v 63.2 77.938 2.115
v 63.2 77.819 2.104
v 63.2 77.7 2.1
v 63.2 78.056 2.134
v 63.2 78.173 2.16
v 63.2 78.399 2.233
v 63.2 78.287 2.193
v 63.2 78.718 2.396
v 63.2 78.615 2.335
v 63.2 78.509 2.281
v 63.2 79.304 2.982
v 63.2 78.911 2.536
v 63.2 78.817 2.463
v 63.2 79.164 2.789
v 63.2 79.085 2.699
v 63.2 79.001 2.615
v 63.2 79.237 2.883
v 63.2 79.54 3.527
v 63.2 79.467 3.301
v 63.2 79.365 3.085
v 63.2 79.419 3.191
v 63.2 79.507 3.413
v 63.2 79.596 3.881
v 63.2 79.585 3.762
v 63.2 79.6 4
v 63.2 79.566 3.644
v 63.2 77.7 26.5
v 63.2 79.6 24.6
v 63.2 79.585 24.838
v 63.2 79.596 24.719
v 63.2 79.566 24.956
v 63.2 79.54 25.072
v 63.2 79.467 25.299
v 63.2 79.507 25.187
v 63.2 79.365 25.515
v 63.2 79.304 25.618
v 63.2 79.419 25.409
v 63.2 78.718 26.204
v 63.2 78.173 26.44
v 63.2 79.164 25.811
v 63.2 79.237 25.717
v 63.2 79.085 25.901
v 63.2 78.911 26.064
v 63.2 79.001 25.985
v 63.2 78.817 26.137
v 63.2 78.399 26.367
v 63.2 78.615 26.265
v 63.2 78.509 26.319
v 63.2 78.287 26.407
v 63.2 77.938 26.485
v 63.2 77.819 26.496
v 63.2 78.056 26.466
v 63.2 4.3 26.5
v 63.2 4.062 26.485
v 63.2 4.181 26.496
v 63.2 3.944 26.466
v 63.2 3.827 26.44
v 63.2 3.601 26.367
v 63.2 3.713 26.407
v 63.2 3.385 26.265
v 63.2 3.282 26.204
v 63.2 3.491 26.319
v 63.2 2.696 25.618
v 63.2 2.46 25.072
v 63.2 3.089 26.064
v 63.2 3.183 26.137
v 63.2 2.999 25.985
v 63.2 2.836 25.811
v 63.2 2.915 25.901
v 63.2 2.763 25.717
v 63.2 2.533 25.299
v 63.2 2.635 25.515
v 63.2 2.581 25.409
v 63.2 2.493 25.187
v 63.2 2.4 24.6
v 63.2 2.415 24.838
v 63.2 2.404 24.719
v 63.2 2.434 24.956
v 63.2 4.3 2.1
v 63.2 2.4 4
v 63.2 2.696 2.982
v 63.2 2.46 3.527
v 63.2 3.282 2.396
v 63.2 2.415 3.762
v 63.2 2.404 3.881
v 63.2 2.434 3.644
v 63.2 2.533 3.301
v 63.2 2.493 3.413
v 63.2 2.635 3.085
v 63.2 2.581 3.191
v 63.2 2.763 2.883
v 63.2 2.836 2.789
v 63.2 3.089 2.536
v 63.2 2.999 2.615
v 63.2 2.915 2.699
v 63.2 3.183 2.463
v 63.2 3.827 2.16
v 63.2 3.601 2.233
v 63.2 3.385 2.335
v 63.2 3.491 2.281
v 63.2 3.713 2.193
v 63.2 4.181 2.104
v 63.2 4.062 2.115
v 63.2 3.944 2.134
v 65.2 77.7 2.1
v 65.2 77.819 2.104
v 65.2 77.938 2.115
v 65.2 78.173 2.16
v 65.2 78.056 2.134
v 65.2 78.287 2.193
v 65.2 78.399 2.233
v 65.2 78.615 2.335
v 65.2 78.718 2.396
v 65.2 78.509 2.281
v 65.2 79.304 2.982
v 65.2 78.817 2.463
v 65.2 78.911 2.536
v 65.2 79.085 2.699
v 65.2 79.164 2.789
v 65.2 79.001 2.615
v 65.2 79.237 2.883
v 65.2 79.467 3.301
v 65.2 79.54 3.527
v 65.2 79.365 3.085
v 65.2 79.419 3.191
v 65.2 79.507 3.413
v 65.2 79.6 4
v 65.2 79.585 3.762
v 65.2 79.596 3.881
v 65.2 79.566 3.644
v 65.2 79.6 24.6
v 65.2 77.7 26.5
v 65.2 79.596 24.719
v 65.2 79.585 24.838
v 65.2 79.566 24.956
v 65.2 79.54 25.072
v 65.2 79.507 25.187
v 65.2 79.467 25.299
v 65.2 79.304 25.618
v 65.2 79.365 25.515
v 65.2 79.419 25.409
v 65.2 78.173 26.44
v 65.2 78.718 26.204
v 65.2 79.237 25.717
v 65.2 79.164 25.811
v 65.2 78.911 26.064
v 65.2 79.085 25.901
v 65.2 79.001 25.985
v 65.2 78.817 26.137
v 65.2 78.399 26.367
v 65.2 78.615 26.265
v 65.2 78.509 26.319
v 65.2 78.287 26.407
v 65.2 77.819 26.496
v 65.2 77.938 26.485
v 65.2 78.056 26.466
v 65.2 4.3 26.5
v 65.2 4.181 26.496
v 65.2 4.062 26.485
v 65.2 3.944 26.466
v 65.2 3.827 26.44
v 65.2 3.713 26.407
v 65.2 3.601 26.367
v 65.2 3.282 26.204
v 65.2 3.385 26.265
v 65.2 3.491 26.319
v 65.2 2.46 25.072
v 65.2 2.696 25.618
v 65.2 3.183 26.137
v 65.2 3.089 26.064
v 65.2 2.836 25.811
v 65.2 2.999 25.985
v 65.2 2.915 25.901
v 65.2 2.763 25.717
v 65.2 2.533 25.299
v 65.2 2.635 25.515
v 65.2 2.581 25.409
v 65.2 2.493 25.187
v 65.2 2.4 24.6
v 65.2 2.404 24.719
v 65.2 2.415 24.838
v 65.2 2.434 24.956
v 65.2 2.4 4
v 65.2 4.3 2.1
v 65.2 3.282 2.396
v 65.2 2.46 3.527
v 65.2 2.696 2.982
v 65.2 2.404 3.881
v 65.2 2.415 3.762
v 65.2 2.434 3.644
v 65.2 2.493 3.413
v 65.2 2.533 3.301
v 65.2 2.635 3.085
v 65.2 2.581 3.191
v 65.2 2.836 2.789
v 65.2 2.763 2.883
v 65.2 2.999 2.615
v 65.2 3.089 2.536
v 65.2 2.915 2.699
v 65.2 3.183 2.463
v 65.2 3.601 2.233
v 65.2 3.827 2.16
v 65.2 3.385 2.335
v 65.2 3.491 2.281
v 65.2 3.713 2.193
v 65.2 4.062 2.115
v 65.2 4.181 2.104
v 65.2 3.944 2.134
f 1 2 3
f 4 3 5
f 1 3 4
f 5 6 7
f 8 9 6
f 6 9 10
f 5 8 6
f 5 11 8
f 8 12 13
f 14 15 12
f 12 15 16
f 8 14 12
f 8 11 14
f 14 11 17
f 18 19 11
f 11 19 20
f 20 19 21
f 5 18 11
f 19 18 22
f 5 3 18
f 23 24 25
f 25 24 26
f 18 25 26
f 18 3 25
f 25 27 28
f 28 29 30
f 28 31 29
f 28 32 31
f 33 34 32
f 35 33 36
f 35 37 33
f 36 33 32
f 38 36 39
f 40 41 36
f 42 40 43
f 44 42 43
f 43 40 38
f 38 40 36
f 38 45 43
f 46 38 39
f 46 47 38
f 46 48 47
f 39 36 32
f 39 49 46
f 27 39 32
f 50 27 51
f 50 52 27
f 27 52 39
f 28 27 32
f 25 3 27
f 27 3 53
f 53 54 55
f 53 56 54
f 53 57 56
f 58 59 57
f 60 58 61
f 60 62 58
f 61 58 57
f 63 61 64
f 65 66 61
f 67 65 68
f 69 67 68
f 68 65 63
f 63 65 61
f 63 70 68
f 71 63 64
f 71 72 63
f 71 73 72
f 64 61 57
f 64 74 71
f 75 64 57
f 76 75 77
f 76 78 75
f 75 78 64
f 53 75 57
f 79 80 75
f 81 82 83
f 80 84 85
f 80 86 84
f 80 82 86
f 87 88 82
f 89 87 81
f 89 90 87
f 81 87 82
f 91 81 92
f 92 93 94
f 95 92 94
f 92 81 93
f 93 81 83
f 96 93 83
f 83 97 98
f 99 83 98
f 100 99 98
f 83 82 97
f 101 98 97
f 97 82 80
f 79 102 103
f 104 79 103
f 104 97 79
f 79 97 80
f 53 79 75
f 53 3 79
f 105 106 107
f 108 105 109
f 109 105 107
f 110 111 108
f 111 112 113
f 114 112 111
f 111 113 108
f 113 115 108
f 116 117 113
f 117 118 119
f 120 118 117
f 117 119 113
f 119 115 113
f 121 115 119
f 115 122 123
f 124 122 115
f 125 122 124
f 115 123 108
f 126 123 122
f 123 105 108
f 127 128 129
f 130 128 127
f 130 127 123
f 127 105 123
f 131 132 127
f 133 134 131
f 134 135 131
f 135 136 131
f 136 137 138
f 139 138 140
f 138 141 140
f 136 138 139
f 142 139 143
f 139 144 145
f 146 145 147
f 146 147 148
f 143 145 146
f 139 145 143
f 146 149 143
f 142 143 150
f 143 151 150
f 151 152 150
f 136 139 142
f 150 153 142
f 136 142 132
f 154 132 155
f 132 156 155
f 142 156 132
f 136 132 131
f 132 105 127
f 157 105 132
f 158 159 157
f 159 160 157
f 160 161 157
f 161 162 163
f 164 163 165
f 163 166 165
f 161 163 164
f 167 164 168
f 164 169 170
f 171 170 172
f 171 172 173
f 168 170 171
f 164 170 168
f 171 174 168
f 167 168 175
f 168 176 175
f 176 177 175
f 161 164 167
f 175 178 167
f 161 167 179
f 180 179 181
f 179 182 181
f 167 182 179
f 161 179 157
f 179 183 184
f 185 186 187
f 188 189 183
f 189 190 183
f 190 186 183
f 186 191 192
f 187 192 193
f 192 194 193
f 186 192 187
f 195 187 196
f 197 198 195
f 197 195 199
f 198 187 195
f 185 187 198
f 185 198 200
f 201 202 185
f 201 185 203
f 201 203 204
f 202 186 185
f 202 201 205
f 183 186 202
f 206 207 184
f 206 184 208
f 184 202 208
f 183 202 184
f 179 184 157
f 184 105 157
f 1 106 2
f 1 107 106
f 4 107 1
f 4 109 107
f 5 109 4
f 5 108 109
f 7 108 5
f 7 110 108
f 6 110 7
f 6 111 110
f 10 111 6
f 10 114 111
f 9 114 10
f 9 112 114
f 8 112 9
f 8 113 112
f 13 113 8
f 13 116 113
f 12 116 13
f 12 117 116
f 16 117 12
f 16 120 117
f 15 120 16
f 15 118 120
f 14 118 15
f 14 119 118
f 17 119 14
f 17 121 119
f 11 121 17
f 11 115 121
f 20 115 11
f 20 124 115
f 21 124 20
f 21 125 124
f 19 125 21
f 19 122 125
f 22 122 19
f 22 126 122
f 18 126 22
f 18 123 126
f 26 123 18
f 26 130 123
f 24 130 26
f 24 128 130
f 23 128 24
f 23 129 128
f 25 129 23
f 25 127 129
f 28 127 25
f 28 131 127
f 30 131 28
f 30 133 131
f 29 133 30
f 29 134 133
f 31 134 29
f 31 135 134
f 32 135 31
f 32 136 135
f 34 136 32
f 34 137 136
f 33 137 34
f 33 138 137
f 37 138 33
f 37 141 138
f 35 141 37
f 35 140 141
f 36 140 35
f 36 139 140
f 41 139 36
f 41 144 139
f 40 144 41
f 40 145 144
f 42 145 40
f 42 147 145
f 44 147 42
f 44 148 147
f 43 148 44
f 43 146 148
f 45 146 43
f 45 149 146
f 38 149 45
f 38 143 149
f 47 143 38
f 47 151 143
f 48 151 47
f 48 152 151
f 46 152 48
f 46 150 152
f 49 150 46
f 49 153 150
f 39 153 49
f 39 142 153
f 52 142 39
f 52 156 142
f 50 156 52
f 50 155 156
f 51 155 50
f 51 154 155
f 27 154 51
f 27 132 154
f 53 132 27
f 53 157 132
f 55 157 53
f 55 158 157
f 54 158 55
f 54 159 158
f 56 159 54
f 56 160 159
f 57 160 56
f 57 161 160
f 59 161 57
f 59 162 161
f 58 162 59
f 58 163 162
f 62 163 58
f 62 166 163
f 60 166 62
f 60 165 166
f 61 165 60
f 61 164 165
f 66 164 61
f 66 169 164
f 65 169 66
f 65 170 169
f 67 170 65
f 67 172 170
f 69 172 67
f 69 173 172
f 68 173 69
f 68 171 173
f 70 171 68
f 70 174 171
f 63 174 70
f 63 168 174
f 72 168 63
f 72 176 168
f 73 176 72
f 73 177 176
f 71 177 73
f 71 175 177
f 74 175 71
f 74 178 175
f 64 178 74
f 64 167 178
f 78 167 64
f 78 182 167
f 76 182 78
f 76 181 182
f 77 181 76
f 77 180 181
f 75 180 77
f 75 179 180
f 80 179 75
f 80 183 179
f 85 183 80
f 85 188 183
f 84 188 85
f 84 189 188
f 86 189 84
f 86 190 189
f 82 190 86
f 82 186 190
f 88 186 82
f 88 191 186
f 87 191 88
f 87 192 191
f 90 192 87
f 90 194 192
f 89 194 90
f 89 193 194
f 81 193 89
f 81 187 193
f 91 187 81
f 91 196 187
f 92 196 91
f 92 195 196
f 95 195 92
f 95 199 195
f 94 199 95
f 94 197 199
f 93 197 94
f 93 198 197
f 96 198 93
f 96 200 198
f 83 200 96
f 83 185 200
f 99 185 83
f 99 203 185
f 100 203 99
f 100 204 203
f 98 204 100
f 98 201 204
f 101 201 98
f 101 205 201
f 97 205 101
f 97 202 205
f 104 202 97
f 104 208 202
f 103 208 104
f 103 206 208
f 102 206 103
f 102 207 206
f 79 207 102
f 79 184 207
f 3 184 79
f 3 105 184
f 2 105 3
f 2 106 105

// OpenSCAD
/* Box design originally by:
////////////////////////////////////////////////////////////////////
              -    FB Aka Heartman/Hearty 2016     -
              -   http://heartygfx.blogspot.com    -
              -       OpenScad Parametric Box      -
              -         CC BY-NC 3.0 License       -
////////////////////////////////////////////////////////////////////

Improved by jbebel:
http://github.com/jbebel/Ultimate-Box-Maker

To create a box, start by modifying the numerical parameters in the sections
below. This can be accomplished using a release of OpenSCAD newer than 2015.03.
As of the time of writing, this means that a development snapshot is required.
The Thingiverse Customizer may also potentially work, but at the time of
writing, it was inoperable.

The simplest choice is to hand-edit the .scad file. Feature toggles are
annotated with a comment. The other numerical parameters are measurements in
mm. Everything is parametrized, so if you double all the non-feature parameters
you will double the box size in every dimension. Certain parameters are derived
from other parameters. If you wish to override them, you may, but sensible
defaults have been chosen. Notably the design in this revision is particularly
PCB-centric, in that you should start with your PCB size and adjust the margins
around it to determine the box size. If you care more about the box size, you
can set the Length, Width, and Height explicitly, but read the comments around
them.

Once your box is sized appropriately, you can use the Panel modules to design
the holes and text for the front and back panels. Helper variables are provided
to assist you in positioning these holes relative to the PCB, if your holes are
for PCB-mounted components.

When you are ready to print, adjust the values in the "STL element to export"
section, and export each part one at a time.

Experimental options are provided for a screwless design, but these are
untested. In particular, the box fixation tabs may need thicknesses adjusted
in order to have the appropriate flexibility.
*/

// preview[view:north east, tilt:top diagonal]
//----------------------- Box parameters ---------------------------

/* [Box options] */
// - Wall thickness
Thick = 2;
// - Panel thickness
PanelThick = 2;
// - Font Thickness
FontThick = 0.5;
// - Filet Radius
Filet = 2;
// - 0 for beveled, 1 for rounded
Round = 1; // [0:No, 1:Yes]
// - Printer margin around interior cutouts
CutoutMargin = 0.3;
// - Margin between mating parts
PartMargin = 0.1;
// - PCB feet? (x4)
PCBFeet = 1; // [0:No, 1:Yes]
// - Decorations?
Decorations = 1; // [0:No, 1:Yes]
// - Decorations to ventilation holes
Vent = 1; // [0:No, 1:Yes]
// - Decoration-Holes width (in mm)
Vent_width = 1.5;
// - Tolerance (Panel/rails gap on one edge)
PanelThickGap = CutoutMargin + PartMargin;
PanelVerticalGap = PartMargin;
PanelHorizontalGap = CutoutMargin + PartMargin;


/* [Box Fixation Tabs] */
// - Side screw hole (or snap) diameter
ScrewHole = 2.2606;
// - Screw thread major diameter for outer shell
BoxHole = 2.8448;
// Thickness of fixation tabs
TabThick = 2;
// Back left tab
BLTab = 1; // [0:Bottom, 1:Top]
// Back right tab
BRTab = 1; // [0:Bottom, 1:Top]
// Front left tab
FLTab = 1; // [0:Bottom, 1:Top]
// Front right tab
FRTab = 1; // [0:Bottom, 1:Top]
// EXPERIMENTAL: Snap tabs
SnapTabs = 0; // [0:Screws, 1:Snaps]


/* [PCB options] */
// - PCB Length
PCBLength = 54;
// - PCB Width
PCBWidth = 68;
// - PCB Thickness
PCBThick = 1.6;
// You likely need to maintain |TabThick| margin on the left and right for tabs
// and whatnot.
// - Margin between front panel and PCB
FrontEdgeMargin = 2;
// - Margin between back panel and PCB
BackEdgeMargin = 2;
// - Margin between left wall and PCB
LeftEdgeMargin = 5;
// - Margin between right wall and PCB
RightEdgeMargin = 5;
// - Margin between top of PCB and box top.
TopMargin = 20;


/* [PCB_Feet] */
// - Foot height above box interior
FootHeight = 3;
// - Foot diameter
FootDia = 8;
// - Hole diameter, or peg for screwless design
FootHole = 0; // tap size for #4 coarse-thread
// - EXPERIMENTAL Screwless design
Screwless = 0; // [0:Screws, 1:Screwless]
FootFilet = FootHeight/4;

// Foot centers are specified as distance from PCB back-left corner.
// X is along the "length" axis, and Y is along the "width" axis.
// - Foot 1 distance from back PCB edge
Foot1X = 5;
// - Foot 1 distance from left PCB edge
Foot1Y = 5;
// - Foot 2 distance from back PCB edge
Foot2X = 5;
// - Foot 2 distance from right PCB edge
Foot2YFromEdge = 5;
Foot2Y = PCBWidth - Foot2YFromEdge;
// - Foot 3 distance from front PCB edge
Foot3XFromEdge = 5;
Foot3X = PCBLength - Foot3XFromEdge;
// - Foot 3 distance from left PCB edge
Foot3Y = 5;
// - Foot 4 distance from front PCB edge
Foot4XFromEdge = 5;
Foot4X = PCBLength - Foot4XFromEdge;
// - Foot 4 distance from right PCB edge
Foot4YFromEdge = 5;
Foot4Y = PCBWidth - Foot4YFromEdge;


/* [STL element to export] */
// - Top shell
TShell = 0; // [0:No, 1:Yes]
// - Bottom shell
BShell = 0; // [0:No, 1:Yes]
// - Front panel
FPanL = 1; // [0:No, 1:Yes]
// - Back panel
BPanL = 0; // [0:No, 1:Yes]
// - Panel holes and text
PanelFeatures = 0; // [0:No, 1:Yes]


/* [Hidden] */
// - Shell color
Couleur1 = "Orange";
// - Panel color
Couleur2 = "OrangeRed";
// - Text color
TextColor = "White";
// - making decorations thicker if it is a vent to make sure they go through
// shell
// Add a small number to Thick in case Filet is 0.
Dec_Thick = Vent ? Thick*1.001 + Filet : Thick/2;
// Separate vents with a square pillar by default.
Dec_Spacing = Thick + Vent_width;
// X offset to center of first vent
Dec_Offset = Thick*2 + PanelThick + PanelThickGap*2 + Dec_Spacing - Vent_width/2;

// Resolution based on Round parameter. Set this first number to something
// smaller to speed up processing. It should always be a multiple of 4.
Resolution = Round ? 100: 4;

/* Calculate box dimensions from PCB. If you want a more box-centric design
   where the outer diameter of the box matters more than the margins around
   the PCB you can set these manually. The PCB will still be placedaccording
   to the left and back margins, and if you want to use the screwless box
   design, you will need to set the TopMargin to
   (Height - Thick*2 - FootHeight - PCBThick)
*/
Length = PCBLength + FrontEdgeMargin + BackEdgeMargin + ((Thick + PanelThick + PanelThickGap*2)*2);
Width = PCBWidth + LeftEdgeMargin + RightEdgeMargin + Thick*2;
Height = FootHeight + PCBThick + TopMargin + Thick*2;
echo("Box: ", Length=Length, Width=Width, Height=Height);
// X position inset of mounting holes and tabs
MountInset = Thick*3 + PanelThick + PanelThickGap*2 + ScrewHole*4;

// Calculate panel dimensions from box dimensions.
PanelWidth = Width - Thick*2 - PanelHorizontalGap*2;
PanelHeight = Height - Thick*2 - PanelVerticalGap*2;


/*  Panel Manager

    Use the below 4 modules to produce holes and text on the front and back
    panels. The holes modules should contain instances of SquareHole or
    CylinderHole defined later in this file. The text modules should contain
    instances of LText or CText defined later in this file. It is
    recommended to use variables that you define for your needs to create
    the size and positions of these objects.
*/

// Calculate board-relative positions with respect to the panel, for
// convenience in placing panel elements.
TopOfBoardWRTPanel = FootHeight + PCBThick - PanelVerticalGap;
LeftEdgeOfBoardWRTFPanel = LeftEdgeMargin - PanelHorizontalGap;
LeftEdgeOfBoardWRTBPanel = RightEdgeMargin - PanelHorizontalGap;
// Visible panel edges
PanelBottomEdge = Thick - PanelVerticalGap;
PanelTopEdge = PanelHeight - Thick + PanelVerticalGap;
PanelLeftEdge = Thick - PanelHorizontalGap;
PanelRightEdge = PanelWidth - Thick + PanelHorizontalGap;


// Holes for front panel
module FPanelHoles() {
    // SquareHole(On/Off, Xpos,Ypos,Length,Width,Filet)
    SquareHole(1, 20, 20, 15, 10, 1);
    SquareHole(1, 40, 20, 15, 10, 1);
    SquareHole(1, 60, 20, 15, 10, 1);
    // CylinderHole(On/Off, Xpos, Ypos, Diameter)
    CylinderHole(1, 27, 40, 8);
    CylinderHole(1, 47, 40, 8);
    CylinderHole(1, 67, 40, 8);
    SquareHole(1, 20, 50, 80, 30, 3);
    CylinderHole(1, 93, 30, 10);
    SquareHole(1, 120, 20, 30, 60, 3);
}


// Text for front panel
module FPanelText() {
    // LText(On/Off, Xpos, Ypos, "Font", Size, "Text", "HAlign", "VAlign")
    LText(1, 20, 83, "Arial Black", 4, "Digital Screen", HAlign="left");
    LText(1, 120, 83, "Arial Black", 4, "Level", HAlign="left");
    LText(1, 20, 11, "Arial Black", 6, "  1     2      3", HAlign="left");
    // CText(On/Off, Xpos, Ypos, "Font", Size, Diameter, Arc(Deg), Starting Angle(Deg),"Text")
    CText(1, 93, 29, "Arial Black", 4, 10, 180, 0,
          ["1", "." , "3", "." , "5", "." , "7", "." , "9", "." , "11"]);
}


// Holes for back panel
module BPanelHoles() {
    CylinderHole(1,
                 LeftEdgeOfBoardWRTBPanel + 16.4,
                 TopOfBoardWRTPanel + 7,
                 5 + PartMargin*2);
    SquareHole(1,
               LeftEdgeOfBoardWRTBPanel + 37.3,
               TopOfBoardWRTPanel,
               39.2,
               12.55,
               1);
}


// Text for back panel
module BPanelText() {
    LText(1,
          LeftEdgeOfBoardWRTBPanel + 16.4,
          TopOfBoardWRTPanel + 7 + 5,
          "Arial Black",
          4, "PWR"
    );
    LText(1,
          LeftEdgeOfBoardWRTBPanel + 37.3 + 39.2/2,
          TopOfBoardWRTPanel + 12.55 + 2,
          "Arial Black",
          4,
          "DATA"
    );
}


// ------- You probably don't need to modify anything below this line. --------


/* Generic rounded box

    Produces a box of the specified dimensions. Corners are rounded
    according to Filet and Resolution parameters.

    Arguments:
    xshrink: the amount to reduce the length on one end compared to the full
        length
    yzshrink: the amount to reduce the width or height on one edge compared
        to the full box
*/
module RoundBox(xshrink=0, yzshrink=0) {
    Filet = (Filet > Thick*2) ? Filet - yzshrink : Filet;
    translate([xshrink, yzshrink, yzshrink]) {
        rotate([90, 0, 90]) {
            linear_extrude(height=Length - xshrink*2) {
                translate([Filet, Filet, 0]) {
                    offset(r=Filet, $fn=Resolution) {
                        square([Width - 2*yzshrink - 2*Filet, Height - 2*yzshrink - 2*Filet]);
                    }
                }
            }
        }
    }
}


/*  MainBox: Main box module

    This module produces the simple main box half. No feet, tabs, vents or
    fixation is applied here.
*/
module MainBox() {
    difference() {
        union() {
            // Makes a hollow box with walls of Thick thickness.
            difference() {
                RoundBox();
                RoundBox(xshrink=Thick, yzshrink=Thick);
            }
            // Makes interior backing for panel as a wall
            difference() {
                RoundBox(xshrink=(Thick + PanelThick + PanelThickGap*2), yzshrink=Thick/2);
                RoundBox(xshrink=(Thick*2 + PanelThick + PanelThickGap*2));
            }
        }
        // Remove the top half
        translate([-Thick, -Thick, Height/2]) {
            cube([Length + Thick*2, Width + Thick*2, Height]);
        }
        // Remove the center for panel visibility.
        RoundBox(xshrink=-Thick, yzshrink=Thick*2);
    }
}


/*  decoration: a single box decoration
*/
module decoration() {
    translate([-Vent_width/2, -Thick, -Thick]) {
        cube([Vent_width, Dec_Thick + Thick, Height/4 + Thick]);
    }
}


/* LeftDecorations: left decorations module

    Produces the decorations/vents for just the left side of the box.
    These can be rotated and translated for the right side.
*/
module LeftDecorations() {
    for (i=[0 : Dec_Spacing : Length/4]) {
        translate([Dec_Offset + i, 0, 0]) {
            decoration();
        }
        translate([Length - Dec_Offset - i, 0, 0]) {
            decoration();
        }
    }
}


/*  Decorations: decorations module

    This module produces the box vents or decorations.
*/
module Decorations() {
    LeftDecorations();
    // Mirror for the right side decorations
    translate([0, Width, 0]) {
        mirror([0, 1, 0]) {
            LeftDecorations();
        }
    }
}


/*  Coque: Shell module

    This module takes no arguments, but produces a box shell. This is half
    the box, including slots for end panels, rounded corners according to
    Filet and Resolution, and vents/decorations according to parameters.
*/
module Coque() {
    color(Couleur1) {
        difference() {
            MainBox();
            if (Decorations) {
                Decorations();
            }
        }
    }
}


/*  tab: tab module

    Produces a single box fixation tab with screw hole or snap button
*/
module tab() {
    translate([0, Thick, Height/2]) {
        rotate([90, 0, 180]) {
            difference() {
                linear_extrude(TabThick) {
                    difference() {
                        circle(r=4*ScrewHole, $fn=6);
                        if (!SnapTabs) {
                            translate([0, ScrewHole*2, 0]) {
                                circle(d=ScrewHole, $fn=100);
                            }
                        }
                    }
                }
                translate([-4*ScrewHole, -ScrewHole, TabThick]) {
                    rotate([90+45, 0, 0]) {
                        cube([8*ScrewHole, 3*ScrewHole, 5*ScrewHole]);
                    }
                }
                translate([-4*ScrewHole, 0, -PartMargin]) {
                    cube([8*ScrewHole,4*ScrewHole,PartMargin*2]);
                }
            }
            if (SnapTabs) {
                translate([0, ScrewHole*2, PartMargin]) {
                    difference() {
                        sphere(d=(ScrewHole - PartMargin*2), $fn=100);
                        translate([0, 0, ScrewHole/2 + TabThick/2]) {
                            cube(ScrewHole, center=true);
                        }
                    }
                }
            }
        }
    }
}


/*  Tabs: tabs module

    This module produces the wall fixation box tabs.
    Tabs are produced according to the parameters for XXTab indicating top
    or bottom.

    Arguments:
        top: 0 for bottom shell tabs. 1 for top shell tabs. defaults to bottom.
*/
module Tabs(top=0) {
    color(Couleur1) {
        if (BLTab == top) {
            translate([MountInset, 0, 0]) {
                tab();
            }
        }
        if (FLTab == top) {
            translate([Length - MountInset, 0, 0]) {
                tab();
            }
        }
        if (BRTab == top) {
            translate([MountInset, Width, 0]) {
                rotate([0, 0, 180]) {
                    tab();
                }
            }
        }
        if (FRTab == top) {
            translate([Length - MountInset, Width, 0]) {
                rotate([0, 0, 180]) {
                    tab();
                }
            }
        }
    }
}


/*  hole: hole module

    Produces a box hole for fixation. This is either a cylinder for a screw
    or a semispherical indention for snap tabs.
*/
module hole() {
    if (SnapTabs) {
        translate([0, -Thick, Height/2 - 2*ScrewHole]) {
            sphere(d=ScrewHole, $fn=100);
        }
    }
    else {
        translate([0, Thick, Height/2 - 2*ScrewHole]) {
            rotate([90, 0, 0]) {
                cylinder(Thick*3, d=BoxHole, $fn=100);
            }
        }
    }
}


/*  Holes: holes module

    This module produces the holes necessary in the box fixation tabs and in
    the wall of the box for the corresponding tabs to affix to. Holes are
    produced according to the parameters for XXTab indicating top or bottom.

    Arguments:
        top: 0 for bottom shell holes. 1 for top shell holes. defaults to
            bottom.
*/
module Holes(top=0) {
    color(Couleur1) {
        if (BRTab != top) {
            translate([MountInset, Width, 0]) {
                hole();
            }
        }
        if (FRTab != top) {
            translate([Length - MountInset, Width, 0]) {
                hole();
            }
        }
        if (BLTab != top) {
            translate([MountInset, 0, 0]) {
                rotate([0, 0, 180]) {
                    hole();
                }
            }
        }
        if (FLTab != top) {
            translate([Length - MountInset, 0, 0]) {
                rotate([0, 0, 180]) {
                    hole();
                }
            }
        }
    }
}

/*  PCB: PCB module

    Produces the model of the PCB using parameters for its size and thickness.
    The text PCB is placed on top of the board. This is called by the Feet()
    module with the % modifier which makes this module translucent and only
    viewed in preview mode.
*/
module PCB() {
    translate([0, 0, FootHeight]) {
        cube([PCBLength, PCBWidth, PCBThick]);
        translate([PCBLength/2, PCBWidth/2, PCBThick]) {
            color("Olive") {
                linear_extrude(height=FontThick) {
                    text("PCB", font="Arial black", halign="center", valign="center");
                }
            }
        }
    }
}


/*  foot module

    Produces a single foot for PCB mounting.
*/
module foot(top=0) {
    color(Couleur1) {
        rotate_extrude($fn=100) {
            difference() {
                union() {
                    if (Screwless && top) { // Foot with TopMargin height
                        square([FootDia/2 + FootFilet, TopMargin]);
                    }
                    else if (Screwless && !top) { // Foot for PCB peg
                        square([FootDia/2 + FootFilet, FootHeight + PCBThick*2]);
                    }
                    else if (!Screwless && !top) { // Foot with screw hole
                        translate([FootHole/2 + CutoutMargin, 0, 0]) {
                            square([(FootDia - FootHole)/2 - CutoutMargin + FootFilet, FootHeight]);
                        }
                    }
                }
                translate([FootDia/2 + FootFilet, FootFilet, 0]) {
                    offset(r=FootFilet, $fn=Resolution) {
                        square(Height);
                    }
                }
                if (Screwless && !top) { // Remove around peg
                    translate([FootHole/2 - PartMargin, FootHeight]) {
                        polygon([[0, 0],
                                 [FootDia/2, 0],
                                 [FootDia/2, PCBThick*3],
                                 [-FootHole/3, PCBThick*3],
                                 [0, PCBThick]
                                ]
                        );
                    }
                }
                if (Screwless && top) { // Remove hole for peg
                    translate([-FootHole/2, TopMargin - PCBThick, 0]) {
                        polygon([[0, 0],
                                 [(FootHole*5/6 + CutoutMargin), 0],
                                 [(FootHole + CutoutMargin), PCBThick],
                                 [(FootHole + CutoutMargin), PCBThick*2],
                                 [0, PCBThick*2],
                                ]
                        );
                    }
                }

            }
        }
    }
}


/*  Feet module

    Combines four feet to form mounting platform for PCB.
    A model of the PCB is included with the background modifier. It is
    translucent but visible in the preview, but not in the final render.

    No arguments are used, but parameters provide the PCB and foot dimensions.
*/
module Feet(top=0) {
    translate([BackEdgeMargin + Thick + PanelThick + PanelThickGap*2, LeftEdgeMargin + Thick, Thick]) {
        if (!top) {
            %PCB();
        }

        if (Screwless || !top ) {
            translate([Foot1X, Foot1Y]) {
                foot(top=top);
            }
            translate([Foot2X, Foot2Y]) {
                foot(top=top);
                }
            translate([Foot3X, Foot3Y]) {
                foot(top=top);
                }
            translate([Foot4X, Foot4Y]) {
                foot(top=top);
            }
        }
    }
}


/*  TopShell: top shell module

    Produces the top shell, including requested fixation tabs and holes
    Model is rotated and translated to the appropriate position.
*/
module TopShell() {
    translate([0, 0, Height + 0.2]) {
        mirror([0, 0, 1]) {
            difference() {
                union() {
                    Coque();
                    Tabs(top=1);
                    if (Screwless && PCBFeet) {
                       Feet(top=1);
                    }
                }
                Holes(top=1);
            }
        }
    }
}


/*  BottomShell: bottom shell module

    Produces the bottom shell, including requested fixation tabs, holes,
    and PCB feet.
*/
module BottomShell() {
    difference() {
        union() {
            Coque();
            Tabs();
            if (PCBFeet) {
               Feet(top=0);
            }
        }
        Holes();
    }
}


/*  Panel module

    Produces a single panel with potentially rounded corners. Takes no
    arguments but uses the global parameters.
*/
module Panel() {
    Filet = (Filet > Thick*2) ? Filet - Thick - PanelVerticalGap : Filet - PanelVerticalGap;
    echo("Panel:", Thick=PanelThick, PanelWidth=PanelWidth, PanelHeight=PanelHeight, Filet=Filet);
    translate([Filet, Filet, 0]) {
        offset(r=Filet, $fn=Resolution) {
            square([PanelWidth - Filet*2, PanelHeight - Filet*2]);
        }
    }
}


/*  Cylinder Hole module

    Produces a cylinder for use as a holein a panel

    Arguments:
    OnOff: Rendered only if 1
    Cx: X position of hole center
    Cy: Y position of hole center
    Cdia: diameter of hole
*/
module CylinderHole(OnOff, Cx, Cy, Cdia) {
    if (OnOff) {
        echo("CylinderHole:", Cx=Cx, Cy=Cy, Cdia=Cdia + CutoutMargin*2);
        translate([Cx, Cy, 0]) {
            circle(d=Cdia + CutoutMargin*2, $fn=100);
        }
    }
}


/*  Square Hole module

    Produces a rectangular prism with potentially rounded corner for use as
    a hole in a panel

    Arguments:
    OnOff: Rendered only if 1
    Sx: X position of bottom left corner
    Sy: Y position of bottom left corner
    Sl: width of rectangle
    Sw: height of rectangle
    Filet: radius of rounded corner
*/
module SquareHole(OnOff, Sx, Sy, Sl, Sw, Filet) {
    if (OnOff) {
        Offset = Filet + CutoutMargin;
        echo("SquareHole:", Sx=Sx - CutoutMargin, Sy=Sy - CutoutMargin,
             Sl=Sl + CutoutMargin*2, Sw=Sw + CutoutMargin*2, Filet=Offset);
        translate([Sx + Filet, Sy + Filet, 0]) {
            offset(r=Offset, $fn=Resolution) {
                square([Sl - Filet*2, Sw - Filet*2]);
            }
        }
    }
}


/*  LText module

    Produces linear text for use on a panel

    Arguments:
    OnOff: Rendered only if 1
    Tx: X position of bottom left corner of text
    Ty: Y position of bottom left corner of text
    Font: Font to use for text
    Size: Approximate Height of text in mm.
    Content: The text
    HAlign: Text horizontal alignment. Defaults to "center". "left" and
        "right" available.
    VAlign: Text vertical alignment. Defaults to "baseline". "top",
        "center", and "bottom" available.
*/
module LText(OnOff,Tx,Ty,Font,Size,Content, HAlign="center", VAlign="baseline") {
    if (OnOff) {
        echo("LText:", Tx=Tx, Ty=Ty, Font=Font, Size=Size, Content=Content, HAlign=HAlign, VAlign=VAlign);
        translate([Tx, Ty, PanelThick]) {
            linear_extrude(height=FontThick) {
                text(Content, size=Size, font=Font, halign=HAlign, valign=VAlign);
            }
        }
    }
}


/*  CText module

    Produces circular text for a panel

    OnOff:Rendered only if 1
    Tx: X position of text
    Ty: Y position of text
    Font: Font to use for text
    Size: Approximate height of text in mm
    TxtRadius: Radius of text
    Angl: Arc angle
    Turn: Starting angle
    Content: The text
*/
module CText(OnOff, Tx, Ty, Font, Size, TxtRadius, Angl, Turn, Content) {
    if (OnOff) {
        echo("CText:", Tx=Tx, Ty=Ty, Font=Font, Size=Size,
             TxtRadius=TxtRadius, Turn=Turn, Content=Content);
        Angle = -Angl / (len(Content) - 1);
        translate([Tx, Ty, PanelThick]) {
            for (i= [0 : len(Content) - 1] ) {
                rotate([0, 0, i*Angle + 90 + Turn]) {
                    translate([0, TxtRadius, 0]) {
                        linear_extrude(height=FontThick) {
                            text(Content[i], size=Size, font=Font, halign="center");
                        }
                    }
                }
            }
        }
    }
}


/*  FPanL module

    Produces the front panel. No arguments are used, but this module imports
    FPanelHoles() and FPanelText() which must be edited to produce holes and
    text for your box.
*/
module FPanL() {
    translate([Length - (Thick + PanelThickGap + PanelThick),
               Thick + PanelHorizontalGap,
               Thick + PanelVerticalGap]) {
        rotate([90, 0, 90]) {
            color(Couleur2) {
                linear_extrude(height=PanelThick) {
                    difference() {
                        Panel();
                        if (PanelFeatures) {
                            FPanelHoles();
                        }
                    }
                }
            }
            color(TextColor) {
                if (PanelFeatures) {
                    FPanelText();
                }
            }
        }
    }
}


/*  BPanL module

    Produces the back panel. No arguments are used, but this module imports
    BPanelHoles() and BPanelText() which must be edited to produce holes and
    text for your box.
*/
module BPanL() {
    translate([Thick + PanelThickGap + PanelThick,
               Thick + PanelHorizontalGap + PanelWidth,
               Thick + PanelVerticalGap]) {
        rotate([90, 0, 270]) {
            color(Couleur2) {
                linear_extrude(height=PanelThick) {
                    difference() {
                        Panel();
                        if (PanelFeatures) {
                            BPanelHoles();
                        }
                    }
                }
            }
            color(TextColor) {
                if (PanelFeatures) {
                    BPanelText();
                }
            }
        }
    }
}


// Top shell
if (TShell) {
    TopShell();
}

// Bottom shell
if (BShell) {
    BottomShell();
}

// Front panel
if (FPanL) {
    FPanL();
}

// Back panel
if (BPanL) {
    BPanL();
}
